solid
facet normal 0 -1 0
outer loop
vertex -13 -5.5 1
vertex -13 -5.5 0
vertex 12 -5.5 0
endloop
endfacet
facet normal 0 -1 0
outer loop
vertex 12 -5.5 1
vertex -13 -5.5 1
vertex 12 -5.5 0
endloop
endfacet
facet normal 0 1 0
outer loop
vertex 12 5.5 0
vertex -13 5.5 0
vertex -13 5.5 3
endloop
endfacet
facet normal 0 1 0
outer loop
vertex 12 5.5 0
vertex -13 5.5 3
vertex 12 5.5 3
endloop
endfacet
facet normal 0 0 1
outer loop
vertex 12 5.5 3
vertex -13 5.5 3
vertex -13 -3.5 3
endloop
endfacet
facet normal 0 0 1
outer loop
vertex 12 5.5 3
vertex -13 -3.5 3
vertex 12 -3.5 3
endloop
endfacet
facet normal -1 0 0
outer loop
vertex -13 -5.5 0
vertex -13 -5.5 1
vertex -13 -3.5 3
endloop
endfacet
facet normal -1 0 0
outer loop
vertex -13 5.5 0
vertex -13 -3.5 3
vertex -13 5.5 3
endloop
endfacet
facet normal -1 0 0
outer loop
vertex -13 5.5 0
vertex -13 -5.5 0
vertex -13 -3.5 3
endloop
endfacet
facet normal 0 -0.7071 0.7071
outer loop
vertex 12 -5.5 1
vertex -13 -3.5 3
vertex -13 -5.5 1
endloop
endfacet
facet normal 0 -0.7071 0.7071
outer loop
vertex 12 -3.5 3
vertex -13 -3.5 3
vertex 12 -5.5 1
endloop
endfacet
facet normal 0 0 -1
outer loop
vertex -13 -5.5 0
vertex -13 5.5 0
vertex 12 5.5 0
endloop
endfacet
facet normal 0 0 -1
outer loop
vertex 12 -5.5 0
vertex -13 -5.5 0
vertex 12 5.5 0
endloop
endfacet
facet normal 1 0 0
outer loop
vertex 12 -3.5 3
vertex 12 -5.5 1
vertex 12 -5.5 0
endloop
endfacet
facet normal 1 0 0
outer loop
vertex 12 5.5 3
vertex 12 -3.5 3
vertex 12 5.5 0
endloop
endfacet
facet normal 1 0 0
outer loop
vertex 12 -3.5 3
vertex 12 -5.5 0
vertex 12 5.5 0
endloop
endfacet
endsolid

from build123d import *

# Parameters (mm, degrees)
SKETCH_1_W      = 25
SKETCH_1_H      = 11
EXTRUDE_1_DEPTH = 3
CHAMFER_3_SIZE  = 2


with BuildPart() as part:
    # Эскиз1 → Вытянуть1 (new body)
    with BuildSketch(Plane.XY):
        with Locations((-0.5, 0)):
            Rectangle(SKETCH_1_W, SKETCH_1_H)
    extrude(amount=EXTRUDE_1_DEPTH)

    # Фаска3
    chamfer_3_edges = [part.edges().sort_by_distance(p)[0] for p in [
        (-0.5, -5.5, 3),
    ]]
    chamfer(chamfer_3_edges, length=CHAMFER_3_SIZE)


solid = part.part
